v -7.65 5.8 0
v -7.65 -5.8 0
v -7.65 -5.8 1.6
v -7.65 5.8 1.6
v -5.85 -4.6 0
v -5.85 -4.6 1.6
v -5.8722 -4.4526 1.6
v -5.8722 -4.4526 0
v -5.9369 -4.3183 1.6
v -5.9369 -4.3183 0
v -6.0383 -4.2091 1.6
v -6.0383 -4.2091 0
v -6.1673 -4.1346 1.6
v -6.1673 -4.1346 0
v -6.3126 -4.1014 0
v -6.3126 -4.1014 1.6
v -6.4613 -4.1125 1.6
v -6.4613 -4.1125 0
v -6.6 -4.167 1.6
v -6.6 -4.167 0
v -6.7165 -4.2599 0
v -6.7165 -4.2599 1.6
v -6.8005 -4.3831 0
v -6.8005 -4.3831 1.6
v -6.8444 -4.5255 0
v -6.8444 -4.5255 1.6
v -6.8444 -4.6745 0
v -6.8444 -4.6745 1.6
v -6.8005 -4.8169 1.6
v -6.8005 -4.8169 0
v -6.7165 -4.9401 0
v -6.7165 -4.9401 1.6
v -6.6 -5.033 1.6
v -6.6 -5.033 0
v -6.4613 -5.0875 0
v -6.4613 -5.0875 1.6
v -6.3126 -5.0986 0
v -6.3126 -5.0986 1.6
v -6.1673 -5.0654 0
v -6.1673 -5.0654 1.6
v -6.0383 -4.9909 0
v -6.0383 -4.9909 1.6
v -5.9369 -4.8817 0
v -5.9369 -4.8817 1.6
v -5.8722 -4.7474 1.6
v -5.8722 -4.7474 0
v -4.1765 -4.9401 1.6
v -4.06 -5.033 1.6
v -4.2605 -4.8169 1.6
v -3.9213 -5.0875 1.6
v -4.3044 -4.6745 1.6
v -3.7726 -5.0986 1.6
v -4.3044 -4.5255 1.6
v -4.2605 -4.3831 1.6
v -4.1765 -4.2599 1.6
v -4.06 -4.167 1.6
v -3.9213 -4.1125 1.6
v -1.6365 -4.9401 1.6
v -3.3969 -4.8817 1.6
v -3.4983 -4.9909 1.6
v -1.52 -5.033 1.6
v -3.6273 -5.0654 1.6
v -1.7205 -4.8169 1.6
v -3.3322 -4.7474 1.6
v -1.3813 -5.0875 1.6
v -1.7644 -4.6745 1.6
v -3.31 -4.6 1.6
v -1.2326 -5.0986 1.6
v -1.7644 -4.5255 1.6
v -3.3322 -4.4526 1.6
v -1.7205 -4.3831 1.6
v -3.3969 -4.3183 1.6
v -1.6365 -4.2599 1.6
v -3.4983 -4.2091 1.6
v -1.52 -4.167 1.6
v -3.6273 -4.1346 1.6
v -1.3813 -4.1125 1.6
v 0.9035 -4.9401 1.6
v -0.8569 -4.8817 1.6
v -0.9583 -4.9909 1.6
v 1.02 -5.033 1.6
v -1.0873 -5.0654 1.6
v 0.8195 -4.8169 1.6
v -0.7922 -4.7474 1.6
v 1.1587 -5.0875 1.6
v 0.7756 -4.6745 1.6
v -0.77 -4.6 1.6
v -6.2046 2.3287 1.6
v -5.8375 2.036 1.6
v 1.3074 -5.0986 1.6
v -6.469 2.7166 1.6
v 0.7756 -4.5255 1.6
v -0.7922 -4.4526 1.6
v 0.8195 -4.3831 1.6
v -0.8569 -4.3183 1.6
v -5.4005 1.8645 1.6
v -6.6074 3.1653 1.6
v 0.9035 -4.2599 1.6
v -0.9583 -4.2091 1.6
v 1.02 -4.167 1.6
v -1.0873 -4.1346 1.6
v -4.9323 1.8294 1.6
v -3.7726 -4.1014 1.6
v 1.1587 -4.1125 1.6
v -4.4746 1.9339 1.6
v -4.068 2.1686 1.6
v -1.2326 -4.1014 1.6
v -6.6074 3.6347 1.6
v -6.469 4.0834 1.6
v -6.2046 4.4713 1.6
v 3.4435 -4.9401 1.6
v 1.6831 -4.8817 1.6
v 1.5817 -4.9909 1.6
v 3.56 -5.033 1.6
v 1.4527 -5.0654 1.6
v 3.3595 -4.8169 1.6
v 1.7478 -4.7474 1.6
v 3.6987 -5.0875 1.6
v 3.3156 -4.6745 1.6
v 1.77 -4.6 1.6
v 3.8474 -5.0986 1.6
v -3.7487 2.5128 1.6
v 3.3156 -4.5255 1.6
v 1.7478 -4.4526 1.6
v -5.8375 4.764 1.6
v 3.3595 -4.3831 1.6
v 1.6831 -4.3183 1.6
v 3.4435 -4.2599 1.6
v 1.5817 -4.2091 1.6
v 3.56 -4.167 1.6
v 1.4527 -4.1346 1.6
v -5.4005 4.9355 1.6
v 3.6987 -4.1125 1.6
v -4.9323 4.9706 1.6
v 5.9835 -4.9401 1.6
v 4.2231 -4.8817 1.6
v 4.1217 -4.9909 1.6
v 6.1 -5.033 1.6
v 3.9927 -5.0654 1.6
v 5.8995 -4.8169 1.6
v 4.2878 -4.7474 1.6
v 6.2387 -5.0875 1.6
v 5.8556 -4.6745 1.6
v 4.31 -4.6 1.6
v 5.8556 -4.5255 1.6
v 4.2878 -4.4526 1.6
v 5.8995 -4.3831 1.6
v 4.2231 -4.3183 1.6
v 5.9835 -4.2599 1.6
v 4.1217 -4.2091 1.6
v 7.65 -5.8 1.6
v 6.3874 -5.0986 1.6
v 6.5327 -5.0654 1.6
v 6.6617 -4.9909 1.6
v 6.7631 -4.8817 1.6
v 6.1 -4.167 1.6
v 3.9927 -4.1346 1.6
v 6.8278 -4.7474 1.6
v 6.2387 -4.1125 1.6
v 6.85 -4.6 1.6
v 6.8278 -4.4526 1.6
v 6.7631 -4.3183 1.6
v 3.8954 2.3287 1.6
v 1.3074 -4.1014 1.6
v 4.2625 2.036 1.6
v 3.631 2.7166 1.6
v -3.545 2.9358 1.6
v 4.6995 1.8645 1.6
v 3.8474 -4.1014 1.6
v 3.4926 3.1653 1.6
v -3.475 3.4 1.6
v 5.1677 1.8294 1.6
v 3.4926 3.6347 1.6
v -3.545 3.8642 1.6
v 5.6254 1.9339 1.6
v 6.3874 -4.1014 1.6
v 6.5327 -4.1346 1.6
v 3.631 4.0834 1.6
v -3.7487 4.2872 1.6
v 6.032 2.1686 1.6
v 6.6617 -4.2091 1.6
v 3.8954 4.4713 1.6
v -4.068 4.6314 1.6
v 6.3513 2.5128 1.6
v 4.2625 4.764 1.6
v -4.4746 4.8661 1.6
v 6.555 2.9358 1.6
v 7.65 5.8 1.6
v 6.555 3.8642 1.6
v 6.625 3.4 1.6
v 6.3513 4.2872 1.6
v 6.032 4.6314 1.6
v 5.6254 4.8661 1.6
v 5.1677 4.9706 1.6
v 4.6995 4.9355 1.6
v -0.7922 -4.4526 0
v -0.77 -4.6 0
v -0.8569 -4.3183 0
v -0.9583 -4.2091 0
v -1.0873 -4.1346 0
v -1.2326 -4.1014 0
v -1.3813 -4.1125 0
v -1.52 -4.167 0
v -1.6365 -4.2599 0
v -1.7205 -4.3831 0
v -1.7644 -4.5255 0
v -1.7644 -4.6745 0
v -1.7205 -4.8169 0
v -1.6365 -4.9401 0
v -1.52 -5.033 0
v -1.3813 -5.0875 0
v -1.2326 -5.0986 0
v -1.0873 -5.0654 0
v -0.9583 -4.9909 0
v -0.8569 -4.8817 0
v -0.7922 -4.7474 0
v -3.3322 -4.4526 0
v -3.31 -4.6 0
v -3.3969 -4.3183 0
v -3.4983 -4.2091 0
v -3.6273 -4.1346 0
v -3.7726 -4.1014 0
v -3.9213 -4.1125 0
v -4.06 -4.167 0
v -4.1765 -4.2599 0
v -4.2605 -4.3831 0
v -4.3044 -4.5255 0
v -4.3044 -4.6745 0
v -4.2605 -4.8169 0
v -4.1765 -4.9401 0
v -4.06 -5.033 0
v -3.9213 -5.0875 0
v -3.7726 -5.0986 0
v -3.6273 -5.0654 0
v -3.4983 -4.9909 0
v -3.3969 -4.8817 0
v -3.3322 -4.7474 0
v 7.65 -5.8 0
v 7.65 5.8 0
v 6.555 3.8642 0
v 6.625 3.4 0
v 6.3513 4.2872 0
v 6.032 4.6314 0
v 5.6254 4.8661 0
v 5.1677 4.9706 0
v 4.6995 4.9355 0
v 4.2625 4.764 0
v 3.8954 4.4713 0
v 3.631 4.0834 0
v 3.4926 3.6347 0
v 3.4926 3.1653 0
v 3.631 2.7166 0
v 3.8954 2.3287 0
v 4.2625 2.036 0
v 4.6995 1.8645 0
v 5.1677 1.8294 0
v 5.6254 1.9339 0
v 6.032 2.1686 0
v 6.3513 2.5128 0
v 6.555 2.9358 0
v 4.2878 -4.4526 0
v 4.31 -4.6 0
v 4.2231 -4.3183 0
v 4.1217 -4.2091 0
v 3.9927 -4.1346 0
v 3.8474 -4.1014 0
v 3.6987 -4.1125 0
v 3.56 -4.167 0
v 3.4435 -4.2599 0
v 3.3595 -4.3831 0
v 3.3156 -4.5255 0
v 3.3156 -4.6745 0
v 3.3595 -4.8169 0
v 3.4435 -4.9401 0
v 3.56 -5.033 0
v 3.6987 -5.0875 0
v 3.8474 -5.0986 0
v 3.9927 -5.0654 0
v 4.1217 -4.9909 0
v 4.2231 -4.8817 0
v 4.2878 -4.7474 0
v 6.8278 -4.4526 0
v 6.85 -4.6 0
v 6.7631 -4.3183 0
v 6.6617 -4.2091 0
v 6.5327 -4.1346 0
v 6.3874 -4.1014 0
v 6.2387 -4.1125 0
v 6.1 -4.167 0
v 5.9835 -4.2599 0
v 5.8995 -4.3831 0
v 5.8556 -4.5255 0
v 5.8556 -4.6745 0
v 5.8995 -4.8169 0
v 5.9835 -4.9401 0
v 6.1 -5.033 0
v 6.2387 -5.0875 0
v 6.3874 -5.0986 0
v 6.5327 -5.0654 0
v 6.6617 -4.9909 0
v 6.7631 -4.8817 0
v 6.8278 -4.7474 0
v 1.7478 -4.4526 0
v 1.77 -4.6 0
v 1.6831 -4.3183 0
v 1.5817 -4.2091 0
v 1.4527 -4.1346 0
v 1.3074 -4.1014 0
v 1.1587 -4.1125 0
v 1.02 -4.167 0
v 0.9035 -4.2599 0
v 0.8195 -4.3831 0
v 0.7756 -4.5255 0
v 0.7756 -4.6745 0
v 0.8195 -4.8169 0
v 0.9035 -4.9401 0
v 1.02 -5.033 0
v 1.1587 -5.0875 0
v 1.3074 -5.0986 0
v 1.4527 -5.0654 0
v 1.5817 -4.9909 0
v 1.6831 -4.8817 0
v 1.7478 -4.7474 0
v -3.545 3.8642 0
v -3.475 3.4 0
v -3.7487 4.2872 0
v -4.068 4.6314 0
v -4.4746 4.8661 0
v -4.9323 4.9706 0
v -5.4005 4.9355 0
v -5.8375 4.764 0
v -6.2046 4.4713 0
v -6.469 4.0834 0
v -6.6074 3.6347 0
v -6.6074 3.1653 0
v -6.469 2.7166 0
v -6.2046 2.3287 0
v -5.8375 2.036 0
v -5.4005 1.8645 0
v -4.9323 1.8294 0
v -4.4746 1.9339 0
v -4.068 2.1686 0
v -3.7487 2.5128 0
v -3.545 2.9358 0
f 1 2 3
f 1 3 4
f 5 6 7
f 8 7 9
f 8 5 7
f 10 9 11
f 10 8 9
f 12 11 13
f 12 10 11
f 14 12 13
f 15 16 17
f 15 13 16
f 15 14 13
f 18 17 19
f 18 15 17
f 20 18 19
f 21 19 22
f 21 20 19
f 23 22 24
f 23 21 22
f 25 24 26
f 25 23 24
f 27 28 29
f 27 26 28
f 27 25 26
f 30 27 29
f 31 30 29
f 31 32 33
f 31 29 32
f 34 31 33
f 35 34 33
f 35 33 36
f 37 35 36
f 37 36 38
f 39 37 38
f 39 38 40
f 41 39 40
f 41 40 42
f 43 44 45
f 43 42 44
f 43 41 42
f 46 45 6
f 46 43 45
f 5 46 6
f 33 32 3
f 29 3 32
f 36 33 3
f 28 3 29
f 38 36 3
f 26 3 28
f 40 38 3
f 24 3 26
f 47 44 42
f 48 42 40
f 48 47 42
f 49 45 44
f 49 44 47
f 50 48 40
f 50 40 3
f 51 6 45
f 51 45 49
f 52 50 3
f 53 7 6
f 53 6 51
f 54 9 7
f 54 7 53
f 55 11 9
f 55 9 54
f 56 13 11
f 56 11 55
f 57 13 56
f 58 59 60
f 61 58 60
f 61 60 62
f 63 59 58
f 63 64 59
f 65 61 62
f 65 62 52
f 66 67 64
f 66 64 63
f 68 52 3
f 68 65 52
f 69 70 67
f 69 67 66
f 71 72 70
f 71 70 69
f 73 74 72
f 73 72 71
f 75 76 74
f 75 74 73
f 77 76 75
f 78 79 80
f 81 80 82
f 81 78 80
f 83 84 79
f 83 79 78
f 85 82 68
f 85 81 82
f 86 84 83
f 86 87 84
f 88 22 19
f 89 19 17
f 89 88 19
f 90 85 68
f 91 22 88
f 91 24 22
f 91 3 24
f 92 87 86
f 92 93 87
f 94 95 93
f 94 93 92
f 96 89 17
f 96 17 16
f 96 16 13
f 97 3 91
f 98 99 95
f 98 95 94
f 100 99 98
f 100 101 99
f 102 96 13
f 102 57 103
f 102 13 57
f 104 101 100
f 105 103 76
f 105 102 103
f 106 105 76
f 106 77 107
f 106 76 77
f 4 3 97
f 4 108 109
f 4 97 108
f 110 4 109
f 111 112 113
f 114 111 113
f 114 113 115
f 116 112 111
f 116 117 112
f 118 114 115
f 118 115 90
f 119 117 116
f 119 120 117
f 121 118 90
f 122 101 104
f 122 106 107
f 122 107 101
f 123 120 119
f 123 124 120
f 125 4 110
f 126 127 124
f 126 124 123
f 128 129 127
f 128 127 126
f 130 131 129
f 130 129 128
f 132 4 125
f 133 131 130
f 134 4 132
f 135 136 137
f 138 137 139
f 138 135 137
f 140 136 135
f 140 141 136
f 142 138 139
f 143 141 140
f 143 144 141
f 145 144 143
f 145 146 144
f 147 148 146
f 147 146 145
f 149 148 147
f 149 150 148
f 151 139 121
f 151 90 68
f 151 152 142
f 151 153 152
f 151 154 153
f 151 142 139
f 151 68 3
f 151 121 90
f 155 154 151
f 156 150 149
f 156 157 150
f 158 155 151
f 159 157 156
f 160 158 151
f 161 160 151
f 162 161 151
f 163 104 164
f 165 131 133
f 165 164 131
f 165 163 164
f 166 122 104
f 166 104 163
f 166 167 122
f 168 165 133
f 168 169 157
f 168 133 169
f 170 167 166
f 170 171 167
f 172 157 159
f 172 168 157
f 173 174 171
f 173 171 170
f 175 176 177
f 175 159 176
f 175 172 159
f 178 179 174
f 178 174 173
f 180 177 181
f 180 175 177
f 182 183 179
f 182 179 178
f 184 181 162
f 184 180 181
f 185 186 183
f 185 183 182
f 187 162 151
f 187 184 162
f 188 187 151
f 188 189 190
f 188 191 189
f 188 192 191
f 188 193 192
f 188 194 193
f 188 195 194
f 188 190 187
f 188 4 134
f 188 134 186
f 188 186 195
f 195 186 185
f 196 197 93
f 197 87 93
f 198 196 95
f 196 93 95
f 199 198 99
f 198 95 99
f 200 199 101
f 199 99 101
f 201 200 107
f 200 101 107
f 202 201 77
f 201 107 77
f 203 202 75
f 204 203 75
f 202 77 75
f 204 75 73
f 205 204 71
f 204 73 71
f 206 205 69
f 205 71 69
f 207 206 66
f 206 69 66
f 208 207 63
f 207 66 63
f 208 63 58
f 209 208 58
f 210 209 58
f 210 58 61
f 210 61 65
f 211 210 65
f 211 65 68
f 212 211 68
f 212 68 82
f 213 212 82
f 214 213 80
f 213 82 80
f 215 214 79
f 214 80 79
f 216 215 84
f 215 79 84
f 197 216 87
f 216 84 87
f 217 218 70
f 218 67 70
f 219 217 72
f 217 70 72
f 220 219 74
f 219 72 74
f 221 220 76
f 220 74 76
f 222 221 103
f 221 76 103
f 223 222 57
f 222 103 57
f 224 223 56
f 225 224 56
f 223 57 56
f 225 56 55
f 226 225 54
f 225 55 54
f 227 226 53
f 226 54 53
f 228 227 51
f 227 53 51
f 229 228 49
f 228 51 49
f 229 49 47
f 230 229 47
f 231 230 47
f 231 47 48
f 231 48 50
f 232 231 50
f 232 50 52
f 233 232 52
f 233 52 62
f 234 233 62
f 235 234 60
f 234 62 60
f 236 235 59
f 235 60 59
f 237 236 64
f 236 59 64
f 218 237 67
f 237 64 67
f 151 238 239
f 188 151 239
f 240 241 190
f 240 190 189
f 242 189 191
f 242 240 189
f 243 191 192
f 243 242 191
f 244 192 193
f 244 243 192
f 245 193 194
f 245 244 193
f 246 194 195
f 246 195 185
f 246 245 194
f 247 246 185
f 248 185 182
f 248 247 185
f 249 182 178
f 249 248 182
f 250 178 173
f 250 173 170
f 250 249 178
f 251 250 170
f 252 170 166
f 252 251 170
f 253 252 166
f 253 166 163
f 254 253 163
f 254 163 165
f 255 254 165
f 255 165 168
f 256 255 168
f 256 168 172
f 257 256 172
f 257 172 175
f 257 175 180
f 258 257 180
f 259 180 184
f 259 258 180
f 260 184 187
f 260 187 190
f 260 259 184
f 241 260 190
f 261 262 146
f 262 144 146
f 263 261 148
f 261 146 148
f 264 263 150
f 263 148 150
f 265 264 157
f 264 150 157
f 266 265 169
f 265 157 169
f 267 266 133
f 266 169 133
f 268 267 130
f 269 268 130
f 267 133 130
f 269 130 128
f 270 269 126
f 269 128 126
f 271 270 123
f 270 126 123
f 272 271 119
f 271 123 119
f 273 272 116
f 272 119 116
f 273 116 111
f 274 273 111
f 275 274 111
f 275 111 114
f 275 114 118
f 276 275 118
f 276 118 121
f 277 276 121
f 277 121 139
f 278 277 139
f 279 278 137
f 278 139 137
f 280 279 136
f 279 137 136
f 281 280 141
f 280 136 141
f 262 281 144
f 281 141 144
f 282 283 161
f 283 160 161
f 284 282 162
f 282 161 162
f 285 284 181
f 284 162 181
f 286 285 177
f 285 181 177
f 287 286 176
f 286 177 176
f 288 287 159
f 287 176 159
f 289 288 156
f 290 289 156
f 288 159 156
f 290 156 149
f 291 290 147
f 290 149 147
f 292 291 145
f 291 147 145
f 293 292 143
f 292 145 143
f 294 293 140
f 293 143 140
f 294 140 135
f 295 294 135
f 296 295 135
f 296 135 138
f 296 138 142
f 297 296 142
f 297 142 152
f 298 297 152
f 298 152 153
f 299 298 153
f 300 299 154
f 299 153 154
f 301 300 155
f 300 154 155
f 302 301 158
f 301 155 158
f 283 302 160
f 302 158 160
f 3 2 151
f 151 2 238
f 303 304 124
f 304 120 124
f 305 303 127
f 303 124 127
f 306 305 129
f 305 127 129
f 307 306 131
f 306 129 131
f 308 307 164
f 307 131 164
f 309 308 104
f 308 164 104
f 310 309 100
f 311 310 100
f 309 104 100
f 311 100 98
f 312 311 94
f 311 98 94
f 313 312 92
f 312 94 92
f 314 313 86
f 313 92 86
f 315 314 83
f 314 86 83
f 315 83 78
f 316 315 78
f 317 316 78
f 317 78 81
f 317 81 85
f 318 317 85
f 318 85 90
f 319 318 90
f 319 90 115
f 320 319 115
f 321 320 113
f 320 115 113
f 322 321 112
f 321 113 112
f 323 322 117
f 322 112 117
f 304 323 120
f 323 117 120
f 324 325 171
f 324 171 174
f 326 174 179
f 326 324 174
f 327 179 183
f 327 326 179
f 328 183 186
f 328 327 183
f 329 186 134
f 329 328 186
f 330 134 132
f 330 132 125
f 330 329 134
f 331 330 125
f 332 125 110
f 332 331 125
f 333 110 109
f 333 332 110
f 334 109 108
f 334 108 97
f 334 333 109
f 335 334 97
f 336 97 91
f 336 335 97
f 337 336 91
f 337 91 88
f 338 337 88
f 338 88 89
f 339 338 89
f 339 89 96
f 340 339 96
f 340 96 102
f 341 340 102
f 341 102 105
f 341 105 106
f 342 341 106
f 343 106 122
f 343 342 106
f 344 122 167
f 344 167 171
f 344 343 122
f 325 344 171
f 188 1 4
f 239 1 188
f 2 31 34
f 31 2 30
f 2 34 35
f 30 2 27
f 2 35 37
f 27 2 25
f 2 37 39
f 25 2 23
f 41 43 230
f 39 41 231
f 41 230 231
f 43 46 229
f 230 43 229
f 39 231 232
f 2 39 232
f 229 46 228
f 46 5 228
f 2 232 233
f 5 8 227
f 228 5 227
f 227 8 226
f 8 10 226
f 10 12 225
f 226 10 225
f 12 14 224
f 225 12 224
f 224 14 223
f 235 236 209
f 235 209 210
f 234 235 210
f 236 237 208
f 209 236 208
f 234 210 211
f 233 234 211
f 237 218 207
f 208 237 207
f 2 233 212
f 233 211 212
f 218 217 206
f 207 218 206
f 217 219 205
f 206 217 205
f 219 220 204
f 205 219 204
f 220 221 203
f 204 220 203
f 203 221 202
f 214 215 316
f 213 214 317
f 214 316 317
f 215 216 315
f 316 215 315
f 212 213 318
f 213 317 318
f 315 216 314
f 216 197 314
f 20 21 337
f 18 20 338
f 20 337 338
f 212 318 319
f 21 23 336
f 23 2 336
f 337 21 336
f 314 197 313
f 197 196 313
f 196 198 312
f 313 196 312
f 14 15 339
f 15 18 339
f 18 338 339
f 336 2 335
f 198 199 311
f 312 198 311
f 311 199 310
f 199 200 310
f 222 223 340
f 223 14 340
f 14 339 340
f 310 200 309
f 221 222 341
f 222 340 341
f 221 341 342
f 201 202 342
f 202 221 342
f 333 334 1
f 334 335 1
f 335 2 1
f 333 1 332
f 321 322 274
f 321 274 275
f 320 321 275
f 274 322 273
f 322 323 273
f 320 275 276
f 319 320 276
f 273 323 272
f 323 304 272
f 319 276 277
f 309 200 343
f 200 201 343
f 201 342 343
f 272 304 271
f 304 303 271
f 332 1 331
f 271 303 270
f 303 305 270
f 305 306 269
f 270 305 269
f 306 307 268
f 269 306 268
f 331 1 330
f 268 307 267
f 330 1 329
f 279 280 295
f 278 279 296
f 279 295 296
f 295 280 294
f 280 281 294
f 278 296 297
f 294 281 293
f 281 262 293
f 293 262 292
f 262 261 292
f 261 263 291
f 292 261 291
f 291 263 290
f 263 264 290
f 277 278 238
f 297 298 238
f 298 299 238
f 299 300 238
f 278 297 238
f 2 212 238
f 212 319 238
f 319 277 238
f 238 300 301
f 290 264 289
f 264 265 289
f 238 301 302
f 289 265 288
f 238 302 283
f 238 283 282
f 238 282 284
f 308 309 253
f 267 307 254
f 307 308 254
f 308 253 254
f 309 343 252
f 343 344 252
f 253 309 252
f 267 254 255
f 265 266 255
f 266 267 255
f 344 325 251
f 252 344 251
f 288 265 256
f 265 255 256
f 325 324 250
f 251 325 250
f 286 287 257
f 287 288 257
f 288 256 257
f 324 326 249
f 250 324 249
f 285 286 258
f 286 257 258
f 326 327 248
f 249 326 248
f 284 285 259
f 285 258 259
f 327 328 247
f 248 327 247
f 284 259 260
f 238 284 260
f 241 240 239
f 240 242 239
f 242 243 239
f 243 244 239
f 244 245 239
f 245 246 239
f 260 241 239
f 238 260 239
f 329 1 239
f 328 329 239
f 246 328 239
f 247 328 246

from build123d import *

# Parameters (mm, degrees)
SKETCH_W            = 15.3
SKETCH_H            = 11.6
SKETCH_R            = 1.575
PAD_DEPTH           = 1.6
SKETCH001_R         = 0.5
POCKET_DEPTH        = 0.001
POCKET_DEPTH_BACK   = 1.601
LINEARPATTERN_COUNT = 6
LINEARPATTERN_PITCH = 2.54


with BuildPart() as part:
    # Sketch → Pad (new body)
    with BuildSketch(Plane.XY):
        Rectangle(SKETCH_W, SKETCH_H)
        with Locations((-5.05, 3.4)):
            Circle(SKETCH_R, mode=Mode.SUBTRACT)
        with Locations((5.05, 3.4)):
            Circle(SKETCH_R, mode=Mode.SUBTRACT)
    extrude(amount=PAD_DEPTH)

    # Sketch001 → Pocket (cut, two sides)
    with BuildSketch(Plane.XY) as pocket_sk:
        with Locations((-6.35, -4.6)):
            Circle(SKETCH001_R)
    pocket = extrude(amount=-POCKET_DEPTH, mode=Mode.SUBTRACT) + extrude(pocket_sk.sketch, amount=POCKET_DEPTH_BACK, mode=Mode.SUBTRACT)

    # LinearPattern: Pocket ×6
    with Locations(*[(i * LINEARPATTERN_PITCH, 0, 0) for i in range(1, LINEARPATTERN_COUNT)]):
        add(pocket, mode=Mode.SUBTRACT)


solid = part.part
